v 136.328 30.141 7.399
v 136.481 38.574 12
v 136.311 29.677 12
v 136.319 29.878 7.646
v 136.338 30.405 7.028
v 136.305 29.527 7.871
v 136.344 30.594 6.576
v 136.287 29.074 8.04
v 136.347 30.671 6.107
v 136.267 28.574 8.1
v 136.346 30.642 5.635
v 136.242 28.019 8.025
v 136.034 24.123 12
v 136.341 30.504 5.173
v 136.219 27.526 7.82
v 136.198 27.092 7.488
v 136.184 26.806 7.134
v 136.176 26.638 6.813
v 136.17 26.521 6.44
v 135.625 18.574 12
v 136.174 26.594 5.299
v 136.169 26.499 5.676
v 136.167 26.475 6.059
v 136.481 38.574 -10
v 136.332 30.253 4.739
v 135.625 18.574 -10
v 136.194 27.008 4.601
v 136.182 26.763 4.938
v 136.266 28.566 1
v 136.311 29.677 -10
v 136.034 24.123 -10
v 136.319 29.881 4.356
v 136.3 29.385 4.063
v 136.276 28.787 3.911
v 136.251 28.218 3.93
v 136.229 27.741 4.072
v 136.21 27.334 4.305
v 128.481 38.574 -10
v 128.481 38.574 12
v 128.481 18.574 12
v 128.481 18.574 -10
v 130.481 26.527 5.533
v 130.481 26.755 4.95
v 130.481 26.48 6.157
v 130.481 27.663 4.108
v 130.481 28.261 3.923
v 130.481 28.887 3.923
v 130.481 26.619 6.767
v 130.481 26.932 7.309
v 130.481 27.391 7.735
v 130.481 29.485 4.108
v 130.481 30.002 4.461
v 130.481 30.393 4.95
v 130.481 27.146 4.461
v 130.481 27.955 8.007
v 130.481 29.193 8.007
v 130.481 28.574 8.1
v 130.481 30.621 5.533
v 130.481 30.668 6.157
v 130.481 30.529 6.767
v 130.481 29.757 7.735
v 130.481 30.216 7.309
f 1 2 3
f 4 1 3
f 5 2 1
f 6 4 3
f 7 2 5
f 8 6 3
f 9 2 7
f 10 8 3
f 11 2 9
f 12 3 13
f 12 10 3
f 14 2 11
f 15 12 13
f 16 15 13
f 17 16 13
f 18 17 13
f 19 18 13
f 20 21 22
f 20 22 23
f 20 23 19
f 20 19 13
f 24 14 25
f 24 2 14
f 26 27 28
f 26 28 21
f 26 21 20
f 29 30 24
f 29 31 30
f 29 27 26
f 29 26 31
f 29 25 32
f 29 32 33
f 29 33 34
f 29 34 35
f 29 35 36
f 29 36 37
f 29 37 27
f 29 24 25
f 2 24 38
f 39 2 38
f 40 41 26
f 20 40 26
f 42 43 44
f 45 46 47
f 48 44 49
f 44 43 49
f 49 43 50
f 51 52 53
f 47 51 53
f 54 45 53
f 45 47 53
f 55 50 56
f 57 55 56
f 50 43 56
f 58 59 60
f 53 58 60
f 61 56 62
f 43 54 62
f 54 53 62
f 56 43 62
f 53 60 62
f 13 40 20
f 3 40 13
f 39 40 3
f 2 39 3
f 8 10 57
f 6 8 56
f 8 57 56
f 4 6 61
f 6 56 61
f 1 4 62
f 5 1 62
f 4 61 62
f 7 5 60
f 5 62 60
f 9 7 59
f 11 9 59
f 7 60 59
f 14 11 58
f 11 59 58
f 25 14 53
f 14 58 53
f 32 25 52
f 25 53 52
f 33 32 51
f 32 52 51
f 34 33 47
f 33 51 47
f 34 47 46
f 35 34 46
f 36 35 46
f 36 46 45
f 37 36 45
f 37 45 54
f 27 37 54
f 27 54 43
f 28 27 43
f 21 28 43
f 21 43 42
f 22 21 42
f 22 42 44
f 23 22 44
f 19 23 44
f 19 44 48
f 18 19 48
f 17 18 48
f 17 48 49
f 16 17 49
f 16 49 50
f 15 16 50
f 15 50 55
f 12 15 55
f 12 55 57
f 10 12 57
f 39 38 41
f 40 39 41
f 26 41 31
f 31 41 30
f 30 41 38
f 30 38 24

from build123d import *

# Parameters (mm, degrees)
BOSS_EXTRUDE1_DEPTH      = 12
BOSS_EXTRUDE1_DEPTH_BACK = 10
CUT_EXTRUDE1_REACH       = 45.182
CUT_EXTRUDE1_START       = -2
SKETCH2_R                = 2.1


with BuildPart() as part:
    # Sketch1 → Boss-Extrude1 (new, two sides: drawn at the far end of the back side and taken through both)
    with BuildSketch(Plane.XY.offset(-BOSS_EXTRUDE1_DEPTH_BACK)):
        with BuildLine():
            Line((136.481143945, 38.574060338), (128.481143945, 38.574060338))
            Line((128.481143945, 38.574060338), (128.481143945, 18.574060338))
            Line((128.481143945, 18.574060338), (135.625186397, 18.574060338))
            add(Edge.make_bspline(
                [(136.481143945, 38.574060338), (136.479179267, 28.55738944), (135.625186397, 18.574060338)],
                knots=[0, 0, 0, 1, 1, 1], degree=2))
        make_face()
    extrude(amount=BOSS_EXTRUDE1_DEPTH + BOSS_EXTRUDE1_DEPTH_BACK)

    # Sketch2 → Cut-Extrude1 (cut, up to next)
    with BuildSketch(Plane.ZY.offset(-128.481143945).offset(CUT_EXTRUDE1_START), mode=Mode.PRIVATE) as cut_extrude1_sk1:
        with Locations((6, 28.574060338)):
            Circle(SKETCH2_R)
    cut_extrude1_tool1 = extrude(cut_extrude1_sk1.sketch, amount=-CUT_EXTRUDE1_REACH, mode=Mode.PRIVATE) & part.part
    add(cut_extrude1_tool1.solids().sort_by_distance((130.481144, 28.57406, 6))[0], mode=Mode.SUBTRACT)


solid = part.part
